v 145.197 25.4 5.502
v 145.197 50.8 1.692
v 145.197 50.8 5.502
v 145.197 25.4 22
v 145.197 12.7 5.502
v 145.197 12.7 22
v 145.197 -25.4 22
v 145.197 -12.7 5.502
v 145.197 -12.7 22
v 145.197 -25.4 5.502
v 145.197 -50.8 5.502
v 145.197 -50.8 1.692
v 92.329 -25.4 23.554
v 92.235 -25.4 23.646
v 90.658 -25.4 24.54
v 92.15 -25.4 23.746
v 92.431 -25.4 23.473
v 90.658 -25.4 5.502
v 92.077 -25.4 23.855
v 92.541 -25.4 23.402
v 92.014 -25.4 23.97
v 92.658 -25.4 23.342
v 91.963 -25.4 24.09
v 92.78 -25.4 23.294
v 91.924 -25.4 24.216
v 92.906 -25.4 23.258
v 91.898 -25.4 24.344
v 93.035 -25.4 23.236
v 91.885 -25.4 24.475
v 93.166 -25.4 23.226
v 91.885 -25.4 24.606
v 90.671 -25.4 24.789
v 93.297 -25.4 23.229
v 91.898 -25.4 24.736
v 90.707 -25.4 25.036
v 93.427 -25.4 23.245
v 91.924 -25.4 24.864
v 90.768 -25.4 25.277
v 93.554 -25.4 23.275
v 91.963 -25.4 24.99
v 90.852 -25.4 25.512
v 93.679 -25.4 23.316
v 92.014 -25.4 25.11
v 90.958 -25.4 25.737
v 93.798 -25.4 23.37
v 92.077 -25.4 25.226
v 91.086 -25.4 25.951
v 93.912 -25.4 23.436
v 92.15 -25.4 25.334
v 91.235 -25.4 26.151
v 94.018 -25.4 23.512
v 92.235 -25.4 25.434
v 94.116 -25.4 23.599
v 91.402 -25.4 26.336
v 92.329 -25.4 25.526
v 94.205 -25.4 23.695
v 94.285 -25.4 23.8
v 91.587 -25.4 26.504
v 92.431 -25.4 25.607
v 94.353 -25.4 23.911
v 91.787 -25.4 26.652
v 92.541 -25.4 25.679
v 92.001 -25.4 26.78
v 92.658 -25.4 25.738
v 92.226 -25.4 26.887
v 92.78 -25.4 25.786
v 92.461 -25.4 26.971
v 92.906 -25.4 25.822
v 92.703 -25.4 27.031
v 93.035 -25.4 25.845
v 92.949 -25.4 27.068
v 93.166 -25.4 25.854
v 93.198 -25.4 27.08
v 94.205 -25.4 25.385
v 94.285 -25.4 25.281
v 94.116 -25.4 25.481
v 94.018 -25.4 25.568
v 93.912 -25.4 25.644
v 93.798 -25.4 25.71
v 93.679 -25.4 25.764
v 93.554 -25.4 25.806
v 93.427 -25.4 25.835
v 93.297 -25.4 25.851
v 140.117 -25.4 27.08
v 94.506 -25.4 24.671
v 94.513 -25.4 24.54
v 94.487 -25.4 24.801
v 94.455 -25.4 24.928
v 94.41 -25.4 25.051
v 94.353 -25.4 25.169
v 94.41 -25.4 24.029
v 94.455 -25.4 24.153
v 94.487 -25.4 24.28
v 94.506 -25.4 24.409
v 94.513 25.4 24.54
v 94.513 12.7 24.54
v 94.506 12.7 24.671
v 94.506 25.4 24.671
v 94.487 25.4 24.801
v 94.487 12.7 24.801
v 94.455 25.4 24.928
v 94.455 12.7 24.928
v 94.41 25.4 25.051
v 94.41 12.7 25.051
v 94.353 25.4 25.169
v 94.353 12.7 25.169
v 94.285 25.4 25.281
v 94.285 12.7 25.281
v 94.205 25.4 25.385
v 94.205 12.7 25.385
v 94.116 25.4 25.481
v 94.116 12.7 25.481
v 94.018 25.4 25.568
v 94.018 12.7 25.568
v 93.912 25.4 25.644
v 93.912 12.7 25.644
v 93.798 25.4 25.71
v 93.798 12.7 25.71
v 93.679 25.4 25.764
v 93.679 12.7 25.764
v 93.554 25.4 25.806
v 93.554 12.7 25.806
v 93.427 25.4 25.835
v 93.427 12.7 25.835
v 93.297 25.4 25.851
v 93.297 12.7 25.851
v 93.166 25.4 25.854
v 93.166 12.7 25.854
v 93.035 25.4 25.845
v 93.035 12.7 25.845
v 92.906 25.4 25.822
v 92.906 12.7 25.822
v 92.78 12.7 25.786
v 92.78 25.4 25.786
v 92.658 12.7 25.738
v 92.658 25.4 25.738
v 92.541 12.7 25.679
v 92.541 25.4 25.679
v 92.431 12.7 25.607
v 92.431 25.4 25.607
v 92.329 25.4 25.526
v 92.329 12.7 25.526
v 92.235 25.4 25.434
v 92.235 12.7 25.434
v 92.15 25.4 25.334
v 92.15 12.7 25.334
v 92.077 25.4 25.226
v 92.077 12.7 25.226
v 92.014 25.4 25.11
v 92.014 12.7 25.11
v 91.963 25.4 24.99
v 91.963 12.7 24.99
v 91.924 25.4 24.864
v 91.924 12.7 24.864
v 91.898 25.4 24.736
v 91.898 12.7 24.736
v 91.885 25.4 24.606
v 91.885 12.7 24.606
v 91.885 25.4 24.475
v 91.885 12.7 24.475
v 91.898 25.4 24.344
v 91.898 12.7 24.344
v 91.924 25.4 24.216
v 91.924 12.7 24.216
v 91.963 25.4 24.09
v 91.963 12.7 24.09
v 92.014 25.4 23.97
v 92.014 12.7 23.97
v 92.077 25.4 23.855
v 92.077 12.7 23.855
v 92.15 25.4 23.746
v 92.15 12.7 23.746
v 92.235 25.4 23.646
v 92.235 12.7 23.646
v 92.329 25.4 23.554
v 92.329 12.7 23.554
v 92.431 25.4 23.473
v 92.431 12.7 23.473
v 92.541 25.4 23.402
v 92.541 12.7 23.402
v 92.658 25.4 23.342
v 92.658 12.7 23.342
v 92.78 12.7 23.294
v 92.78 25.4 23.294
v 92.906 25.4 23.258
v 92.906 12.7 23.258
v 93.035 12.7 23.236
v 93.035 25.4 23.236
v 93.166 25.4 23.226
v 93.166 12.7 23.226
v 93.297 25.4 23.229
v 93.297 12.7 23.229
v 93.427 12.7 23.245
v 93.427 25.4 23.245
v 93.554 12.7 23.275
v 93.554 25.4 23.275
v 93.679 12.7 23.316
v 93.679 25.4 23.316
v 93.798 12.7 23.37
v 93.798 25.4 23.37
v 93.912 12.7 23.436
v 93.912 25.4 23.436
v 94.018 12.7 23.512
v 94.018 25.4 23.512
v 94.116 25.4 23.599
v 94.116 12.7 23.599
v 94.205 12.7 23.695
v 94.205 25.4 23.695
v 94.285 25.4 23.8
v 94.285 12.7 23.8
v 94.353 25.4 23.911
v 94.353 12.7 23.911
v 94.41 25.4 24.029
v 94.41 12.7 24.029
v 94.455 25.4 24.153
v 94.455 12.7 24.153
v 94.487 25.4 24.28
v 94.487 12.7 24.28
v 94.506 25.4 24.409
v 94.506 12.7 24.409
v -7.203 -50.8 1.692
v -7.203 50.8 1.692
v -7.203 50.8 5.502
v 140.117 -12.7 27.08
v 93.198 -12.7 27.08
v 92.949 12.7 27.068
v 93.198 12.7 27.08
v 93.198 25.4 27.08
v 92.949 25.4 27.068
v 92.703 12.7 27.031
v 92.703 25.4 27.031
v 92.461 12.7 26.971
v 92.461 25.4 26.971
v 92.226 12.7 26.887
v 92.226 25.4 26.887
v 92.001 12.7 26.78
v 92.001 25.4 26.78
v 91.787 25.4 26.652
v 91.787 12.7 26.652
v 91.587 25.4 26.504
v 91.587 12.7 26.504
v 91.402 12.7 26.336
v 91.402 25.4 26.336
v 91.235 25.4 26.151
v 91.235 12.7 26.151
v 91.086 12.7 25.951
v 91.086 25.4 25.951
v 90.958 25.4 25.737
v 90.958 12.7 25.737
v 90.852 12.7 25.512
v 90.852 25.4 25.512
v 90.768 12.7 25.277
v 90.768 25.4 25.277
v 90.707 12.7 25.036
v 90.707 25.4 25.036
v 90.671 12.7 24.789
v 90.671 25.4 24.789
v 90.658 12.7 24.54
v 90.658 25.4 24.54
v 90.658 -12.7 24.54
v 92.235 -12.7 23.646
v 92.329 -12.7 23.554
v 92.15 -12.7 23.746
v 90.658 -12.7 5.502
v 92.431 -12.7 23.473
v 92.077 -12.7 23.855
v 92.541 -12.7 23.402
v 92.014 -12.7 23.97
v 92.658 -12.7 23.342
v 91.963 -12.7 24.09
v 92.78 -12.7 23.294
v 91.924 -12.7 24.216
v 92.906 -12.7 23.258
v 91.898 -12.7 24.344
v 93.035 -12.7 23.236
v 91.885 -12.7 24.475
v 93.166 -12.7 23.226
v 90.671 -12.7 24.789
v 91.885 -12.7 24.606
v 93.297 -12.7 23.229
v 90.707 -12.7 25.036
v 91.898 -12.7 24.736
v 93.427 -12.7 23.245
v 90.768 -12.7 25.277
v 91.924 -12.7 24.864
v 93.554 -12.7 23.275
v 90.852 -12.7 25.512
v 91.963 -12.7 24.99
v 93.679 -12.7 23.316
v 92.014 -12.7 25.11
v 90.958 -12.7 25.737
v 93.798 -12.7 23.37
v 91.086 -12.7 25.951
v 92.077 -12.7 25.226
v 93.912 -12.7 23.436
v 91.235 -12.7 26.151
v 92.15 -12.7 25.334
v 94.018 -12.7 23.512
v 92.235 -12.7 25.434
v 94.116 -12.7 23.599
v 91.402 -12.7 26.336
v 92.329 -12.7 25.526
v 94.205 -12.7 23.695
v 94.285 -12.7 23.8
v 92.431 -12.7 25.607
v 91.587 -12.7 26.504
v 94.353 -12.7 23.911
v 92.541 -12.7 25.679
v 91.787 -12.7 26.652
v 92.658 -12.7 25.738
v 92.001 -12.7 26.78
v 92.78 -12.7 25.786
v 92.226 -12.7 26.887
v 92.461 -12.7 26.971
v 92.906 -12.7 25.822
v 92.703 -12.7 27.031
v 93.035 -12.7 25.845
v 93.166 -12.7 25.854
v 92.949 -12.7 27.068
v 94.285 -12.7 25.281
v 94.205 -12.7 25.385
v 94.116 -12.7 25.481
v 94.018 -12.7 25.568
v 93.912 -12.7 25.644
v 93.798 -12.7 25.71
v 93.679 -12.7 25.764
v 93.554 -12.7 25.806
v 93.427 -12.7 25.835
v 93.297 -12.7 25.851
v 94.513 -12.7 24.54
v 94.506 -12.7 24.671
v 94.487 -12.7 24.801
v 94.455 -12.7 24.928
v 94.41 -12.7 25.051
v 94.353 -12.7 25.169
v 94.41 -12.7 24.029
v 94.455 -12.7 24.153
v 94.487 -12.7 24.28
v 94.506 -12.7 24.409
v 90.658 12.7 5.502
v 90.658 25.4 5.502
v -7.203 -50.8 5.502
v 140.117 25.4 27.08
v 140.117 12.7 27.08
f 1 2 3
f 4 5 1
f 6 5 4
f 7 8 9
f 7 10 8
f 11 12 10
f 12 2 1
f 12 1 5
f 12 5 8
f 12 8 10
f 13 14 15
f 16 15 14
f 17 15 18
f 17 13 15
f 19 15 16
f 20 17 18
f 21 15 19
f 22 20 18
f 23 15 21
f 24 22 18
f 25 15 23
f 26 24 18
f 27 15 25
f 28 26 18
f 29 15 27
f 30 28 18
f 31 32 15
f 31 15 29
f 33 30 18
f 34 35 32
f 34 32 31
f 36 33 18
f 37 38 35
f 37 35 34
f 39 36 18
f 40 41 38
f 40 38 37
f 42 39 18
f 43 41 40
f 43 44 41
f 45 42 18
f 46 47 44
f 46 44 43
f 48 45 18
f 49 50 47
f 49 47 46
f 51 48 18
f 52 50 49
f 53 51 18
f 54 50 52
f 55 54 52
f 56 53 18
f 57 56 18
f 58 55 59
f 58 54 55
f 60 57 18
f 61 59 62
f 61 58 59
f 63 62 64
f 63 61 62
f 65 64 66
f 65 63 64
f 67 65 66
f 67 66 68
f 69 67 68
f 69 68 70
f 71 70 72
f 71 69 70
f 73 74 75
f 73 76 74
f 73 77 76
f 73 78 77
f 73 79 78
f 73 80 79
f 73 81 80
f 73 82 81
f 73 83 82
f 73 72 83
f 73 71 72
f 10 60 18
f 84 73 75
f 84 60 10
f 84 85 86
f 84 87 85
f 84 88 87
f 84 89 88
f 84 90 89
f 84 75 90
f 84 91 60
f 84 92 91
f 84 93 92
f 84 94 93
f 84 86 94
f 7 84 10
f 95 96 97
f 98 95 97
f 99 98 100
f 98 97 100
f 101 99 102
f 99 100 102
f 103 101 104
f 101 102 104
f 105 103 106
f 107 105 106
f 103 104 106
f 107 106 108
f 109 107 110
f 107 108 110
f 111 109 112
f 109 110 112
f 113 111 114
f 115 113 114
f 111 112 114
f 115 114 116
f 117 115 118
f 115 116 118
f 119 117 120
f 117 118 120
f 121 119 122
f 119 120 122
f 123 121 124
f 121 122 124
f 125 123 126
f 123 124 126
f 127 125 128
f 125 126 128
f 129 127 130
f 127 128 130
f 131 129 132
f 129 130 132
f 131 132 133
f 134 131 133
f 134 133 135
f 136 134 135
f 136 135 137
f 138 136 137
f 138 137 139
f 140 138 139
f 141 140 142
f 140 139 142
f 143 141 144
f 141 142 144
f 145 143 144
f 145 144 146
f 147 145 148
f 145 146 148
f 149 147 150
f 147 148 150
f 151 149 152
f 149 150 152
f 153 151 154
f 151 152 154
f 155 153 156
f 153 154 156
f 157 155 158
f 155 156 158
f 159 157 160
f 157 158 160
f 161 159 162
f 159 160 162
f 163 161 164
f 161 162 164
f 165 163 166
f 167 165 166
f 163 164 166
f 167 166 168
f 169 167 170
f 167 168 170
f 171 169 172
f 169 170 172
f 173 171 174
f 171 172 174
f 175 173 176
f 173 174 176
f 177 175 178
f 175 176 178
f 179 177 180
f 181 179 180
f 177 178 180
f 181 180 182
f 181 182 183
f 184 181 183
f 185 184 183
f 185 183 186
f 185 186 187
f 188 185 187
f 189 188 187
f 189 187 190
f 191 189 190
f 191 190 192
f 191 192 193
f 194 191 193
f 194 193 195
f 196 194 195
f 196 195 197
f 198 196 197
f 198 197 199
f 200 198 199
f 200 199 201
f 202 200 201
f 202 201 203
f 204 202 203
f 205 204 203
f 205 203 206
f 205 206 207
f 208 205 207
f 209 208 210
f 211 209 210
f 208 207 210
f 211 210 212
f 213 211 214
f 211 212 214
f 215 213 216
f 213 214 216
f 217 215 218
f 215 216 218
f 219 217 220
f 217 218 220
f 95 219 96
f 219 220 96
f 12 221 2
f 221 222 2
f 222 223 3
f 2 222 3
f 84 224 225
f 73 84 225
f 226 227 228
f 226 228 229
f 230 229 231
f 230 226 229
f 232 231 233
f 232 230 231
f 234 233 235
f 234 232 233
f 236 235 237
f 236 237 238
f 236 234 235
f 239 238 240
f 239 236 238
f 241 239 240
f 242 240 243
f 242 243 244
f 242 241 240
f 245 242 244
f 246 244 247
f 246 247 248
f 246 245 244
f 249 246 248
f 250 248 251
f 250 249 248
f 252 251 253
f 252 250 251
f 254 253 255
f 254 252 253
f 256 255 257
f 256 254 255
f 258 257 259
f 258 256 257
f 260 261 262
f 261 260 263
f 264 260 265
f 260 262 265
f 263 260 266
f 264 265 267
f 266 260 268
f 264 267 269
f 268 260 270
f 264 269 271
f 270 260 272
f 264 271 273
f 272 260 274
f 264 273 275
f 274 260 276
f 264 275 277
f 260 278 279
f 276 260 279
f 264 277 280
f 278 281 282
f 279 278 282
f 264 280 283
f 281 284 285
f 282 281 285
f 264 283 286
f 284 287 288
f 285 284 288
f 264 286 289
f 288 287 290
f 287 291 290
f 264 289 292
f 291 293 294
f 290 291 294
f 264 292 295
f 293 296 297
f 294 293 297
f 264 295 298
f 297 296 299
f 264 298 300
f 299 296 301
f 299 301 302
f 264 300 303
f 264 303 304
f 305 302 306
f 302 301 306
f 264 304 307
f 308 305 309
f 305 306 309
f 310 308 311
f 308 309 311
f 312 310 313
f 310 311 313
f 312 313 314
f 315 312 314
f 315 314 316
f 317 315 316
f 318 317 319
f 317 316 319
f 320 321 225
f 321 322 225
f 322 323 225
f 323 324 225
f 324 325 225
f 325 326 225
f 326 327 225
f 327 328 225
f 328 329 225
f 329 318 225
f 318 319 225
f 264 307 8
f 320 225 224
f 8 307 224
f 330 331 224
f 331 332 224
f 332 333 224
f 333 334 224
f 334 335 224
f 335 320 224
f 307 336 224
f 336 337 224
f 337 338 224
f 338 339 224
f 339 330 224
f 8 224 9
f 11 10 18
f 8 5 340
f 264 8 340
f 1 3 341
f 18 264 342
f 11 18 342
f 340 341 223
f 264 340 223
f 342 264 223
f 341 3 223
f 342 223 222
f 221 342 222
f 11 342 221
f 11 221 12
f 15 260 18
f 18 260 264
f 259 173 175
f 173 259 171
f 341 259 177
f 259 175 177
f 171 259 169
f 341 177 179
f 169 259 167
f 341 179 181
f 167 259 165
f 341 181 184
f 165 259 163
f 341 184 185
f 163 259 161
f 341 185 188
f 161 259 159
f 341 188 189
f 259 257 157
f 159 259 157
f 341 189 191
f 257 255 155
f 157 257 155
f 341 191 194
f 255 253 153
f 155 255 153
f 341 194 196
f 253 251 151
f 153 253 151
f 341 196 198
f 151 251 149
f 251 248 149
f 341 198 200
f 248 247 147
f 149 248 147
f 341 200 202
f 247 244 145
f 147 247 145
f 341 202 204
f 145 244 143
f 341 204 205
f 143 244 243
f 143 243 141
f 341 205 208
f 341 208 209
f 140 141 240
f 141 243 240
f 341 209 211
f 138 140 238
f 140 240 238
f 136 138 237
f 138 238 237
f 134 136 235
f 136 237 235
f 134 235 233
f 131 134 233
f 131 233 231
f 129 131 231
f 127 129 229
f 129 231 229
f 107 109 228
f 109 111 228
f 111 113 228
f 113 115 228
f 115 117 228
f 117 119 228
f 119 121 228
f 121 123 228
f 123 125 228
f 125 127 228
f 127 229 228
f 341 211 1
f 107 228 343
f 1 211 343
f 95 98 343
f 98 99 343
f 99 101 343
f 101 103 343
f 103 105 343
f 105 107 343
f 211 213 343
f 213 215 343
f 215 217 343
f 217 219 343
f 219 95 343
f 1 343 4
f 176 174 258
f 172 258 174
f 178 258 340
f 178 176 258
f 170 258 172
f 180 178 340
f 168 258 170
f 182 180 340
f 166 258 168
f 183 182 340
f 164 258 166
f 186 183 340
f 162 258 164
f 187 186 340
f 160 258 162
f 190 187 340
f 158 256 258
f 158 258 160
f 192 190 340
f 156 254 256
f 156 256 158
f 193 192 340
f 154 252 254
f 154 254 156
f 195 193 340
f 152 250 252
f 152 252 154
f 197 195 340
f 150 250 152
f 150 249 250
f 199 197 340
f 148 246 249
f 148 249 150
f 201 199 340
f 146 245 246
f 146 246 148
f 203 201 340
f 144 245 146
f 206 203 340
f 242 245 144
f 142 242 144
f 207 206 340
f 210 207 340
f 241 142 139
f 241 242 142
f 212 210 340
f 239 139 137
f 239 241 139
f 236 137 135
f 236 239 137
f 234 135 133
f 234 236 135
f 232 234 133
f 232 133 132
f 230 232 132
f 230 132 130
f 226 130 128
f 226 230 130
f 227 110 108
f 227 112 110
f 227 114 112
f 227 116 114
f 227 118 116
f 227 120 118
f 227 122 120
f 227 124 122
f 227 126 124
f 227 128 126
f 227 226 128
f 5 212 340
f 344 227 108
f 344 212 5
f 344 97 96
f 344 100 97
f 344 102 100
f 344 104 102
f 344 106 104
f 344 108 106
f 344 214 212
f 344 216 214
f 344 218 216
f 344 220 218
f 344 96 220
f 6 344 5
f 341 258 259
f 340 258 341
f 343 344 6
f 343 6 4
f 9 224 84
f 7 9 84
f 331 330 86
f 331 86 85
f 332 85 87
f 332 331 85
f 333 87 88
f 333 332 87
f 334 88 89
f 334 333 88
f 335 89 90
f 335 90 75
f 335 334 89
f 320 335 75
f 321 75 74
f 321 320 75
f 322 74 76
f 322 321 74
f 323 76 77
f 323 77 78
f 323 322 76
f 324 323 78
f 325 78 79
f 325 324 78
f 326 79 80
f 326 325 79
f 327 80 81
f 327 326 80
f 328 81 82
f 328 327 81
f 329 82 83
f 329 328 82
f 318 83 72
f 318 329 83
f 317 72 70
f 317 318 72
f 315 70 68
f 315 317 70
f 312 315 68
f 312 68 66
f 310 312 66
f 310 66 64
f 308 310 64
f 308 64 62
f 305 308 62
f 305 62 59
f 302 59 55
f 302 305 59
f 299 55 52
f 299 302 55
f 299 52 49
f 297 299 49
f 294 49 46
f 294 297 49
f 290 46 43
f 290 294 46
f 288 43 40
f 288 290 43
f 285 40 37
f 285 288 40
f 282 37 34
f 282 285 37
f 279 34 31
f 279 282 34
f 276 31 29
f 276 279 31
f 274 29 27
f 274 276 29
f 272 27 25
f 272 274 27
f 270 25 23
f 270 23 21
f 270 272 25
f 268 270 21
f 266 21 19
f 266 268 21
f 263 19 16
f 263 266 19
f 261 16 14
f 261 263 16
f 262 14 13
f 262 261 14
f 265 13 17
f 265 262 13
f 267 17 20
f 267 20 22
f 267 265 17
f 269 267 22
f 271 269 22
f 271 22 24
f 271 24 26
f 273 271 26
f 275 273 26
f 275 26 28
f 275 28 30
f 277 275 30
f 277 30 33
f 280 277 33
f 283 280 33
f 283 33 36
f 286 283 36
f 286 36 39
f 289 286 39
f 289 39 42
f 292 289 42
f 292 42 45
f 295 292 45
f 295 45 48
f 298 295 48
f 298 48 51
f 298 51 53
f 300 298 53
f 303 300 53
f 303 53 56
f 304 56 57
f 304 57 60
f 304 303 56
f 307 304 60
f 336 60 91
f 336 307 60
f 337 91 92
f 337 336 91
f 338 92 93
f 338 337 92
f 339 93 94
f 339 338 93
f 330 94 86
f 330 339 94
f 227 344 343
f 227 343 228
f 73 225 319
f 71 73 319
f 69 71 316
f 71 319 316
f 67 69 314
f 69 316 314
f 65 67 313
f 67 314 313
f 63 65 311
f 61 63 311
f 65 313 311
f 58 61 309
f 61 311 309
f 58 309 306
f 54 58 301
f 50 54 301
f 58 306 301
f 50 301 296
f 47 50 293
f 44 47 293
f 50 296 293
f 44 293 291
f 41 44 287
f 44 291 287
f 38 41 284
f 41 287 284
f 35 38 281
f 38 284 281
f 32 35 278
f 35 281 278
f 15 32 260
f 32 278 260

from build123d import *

# Parameters (mm, degrees)
F1_DEPTH = 50.8
F2_START = -12.7
F0_R     = 1.3146247551
F2_DEPTH = 12.7
F3_START = 12.7
F3_DEPTH = 12.7
F4_SIZE  = 5.08


with BuildPart() as f1:
    # F0 (on Front) → F1 (new body, symmetric)
    with BuildSketch(Plane.XZ):
        Polygon((90.658403933, 5.5023488702), (-7.2033622317, 5.5023488702), (-7.2033622317, 1.6923488702), (145.1966377683, 1.6923488702), (145.1966377683, 5.5023488702), align=None)
    extrude(amount=F1_DEPTH, both=True)

    # F0 (on Front) → F2 (join)
    with BuildSketch(Plane.XZ.offset(F2_START)):
        Polygon((90.658403933, 5.5023488702), (-7.2033622317, 5.5023488702), (-7.2033622317, 1.6923488702), (145.1966377683, 1.6923488702), (145.1966377683, 5.5023488702), align=None)
        with BuildLine():
            Line((90.658403933, 24.540095979), (90.658403933, 5.5023488702))
            Line((90.658403933, 5.5023488702), (145.1966377683, 5.5023488702))
            Line((145.1966377683, 5.5023488702), (145.1966377683, 27.080095979))
            Line((145.1966377683, 27.080095979), (93.198403933, 27.080095979))
            ThreePointArc((93.198403933, 27.080095979), (91.4023527088, 26.3361472032), (90.658403933, 24.540095979))
        make_face()
        with Locations((93.198403933, 24.540095979)):
            Circle(F0_R, mode=Mode.SUBTRACT)
    extrude(amount=-F2_DEPTH)

    # F0 (on Front) → F3 (join)
    with BuildSketch(Plane.XZ.offset(F3_START)):
        Polygon((90.658403933, 5.5023488702), (-7.2033622317, 5.5023488702), (-7.2033622317, 1.6923488702), (145.1966377683, 1.6923488702), (145.1966377683, 5.5023488702), align=None)
        with BuildLine():
            Line((90.658403933, 24.540095979), (90.658403933, 5.5023488702))
            Line((90.658403933, 5.5023488702), (145.1966377683, 5.5023488702))
            Line((145.1966377683, 5.5023488702), (145.1966377683, 27.080095979))
            Line((145.1966377683, 27.080095979), (93.198403933, 27.080095979))
            ThreePointArc((93.198403933, 27.080095979), (91.4023527088, 26.3361472032), (90.658403933, 24.540095979))
        make_face()
        with Locations((93.198403933, 24.540095979)):
            Circle(F0_R, mode=Mode.SUBTRACT)
    extrude(amount=F3_DEPTH)

    # F4
    f4_edges = [f1.edges().sort_by_distance(p)[0] for p in [
        (145.196638, 19.05, 27.080096),
        (145.196638, -19.05, 27.080096),
    ]]
    chamfer(f4_edges, length=F4_SIZE)


solid = f1.part
